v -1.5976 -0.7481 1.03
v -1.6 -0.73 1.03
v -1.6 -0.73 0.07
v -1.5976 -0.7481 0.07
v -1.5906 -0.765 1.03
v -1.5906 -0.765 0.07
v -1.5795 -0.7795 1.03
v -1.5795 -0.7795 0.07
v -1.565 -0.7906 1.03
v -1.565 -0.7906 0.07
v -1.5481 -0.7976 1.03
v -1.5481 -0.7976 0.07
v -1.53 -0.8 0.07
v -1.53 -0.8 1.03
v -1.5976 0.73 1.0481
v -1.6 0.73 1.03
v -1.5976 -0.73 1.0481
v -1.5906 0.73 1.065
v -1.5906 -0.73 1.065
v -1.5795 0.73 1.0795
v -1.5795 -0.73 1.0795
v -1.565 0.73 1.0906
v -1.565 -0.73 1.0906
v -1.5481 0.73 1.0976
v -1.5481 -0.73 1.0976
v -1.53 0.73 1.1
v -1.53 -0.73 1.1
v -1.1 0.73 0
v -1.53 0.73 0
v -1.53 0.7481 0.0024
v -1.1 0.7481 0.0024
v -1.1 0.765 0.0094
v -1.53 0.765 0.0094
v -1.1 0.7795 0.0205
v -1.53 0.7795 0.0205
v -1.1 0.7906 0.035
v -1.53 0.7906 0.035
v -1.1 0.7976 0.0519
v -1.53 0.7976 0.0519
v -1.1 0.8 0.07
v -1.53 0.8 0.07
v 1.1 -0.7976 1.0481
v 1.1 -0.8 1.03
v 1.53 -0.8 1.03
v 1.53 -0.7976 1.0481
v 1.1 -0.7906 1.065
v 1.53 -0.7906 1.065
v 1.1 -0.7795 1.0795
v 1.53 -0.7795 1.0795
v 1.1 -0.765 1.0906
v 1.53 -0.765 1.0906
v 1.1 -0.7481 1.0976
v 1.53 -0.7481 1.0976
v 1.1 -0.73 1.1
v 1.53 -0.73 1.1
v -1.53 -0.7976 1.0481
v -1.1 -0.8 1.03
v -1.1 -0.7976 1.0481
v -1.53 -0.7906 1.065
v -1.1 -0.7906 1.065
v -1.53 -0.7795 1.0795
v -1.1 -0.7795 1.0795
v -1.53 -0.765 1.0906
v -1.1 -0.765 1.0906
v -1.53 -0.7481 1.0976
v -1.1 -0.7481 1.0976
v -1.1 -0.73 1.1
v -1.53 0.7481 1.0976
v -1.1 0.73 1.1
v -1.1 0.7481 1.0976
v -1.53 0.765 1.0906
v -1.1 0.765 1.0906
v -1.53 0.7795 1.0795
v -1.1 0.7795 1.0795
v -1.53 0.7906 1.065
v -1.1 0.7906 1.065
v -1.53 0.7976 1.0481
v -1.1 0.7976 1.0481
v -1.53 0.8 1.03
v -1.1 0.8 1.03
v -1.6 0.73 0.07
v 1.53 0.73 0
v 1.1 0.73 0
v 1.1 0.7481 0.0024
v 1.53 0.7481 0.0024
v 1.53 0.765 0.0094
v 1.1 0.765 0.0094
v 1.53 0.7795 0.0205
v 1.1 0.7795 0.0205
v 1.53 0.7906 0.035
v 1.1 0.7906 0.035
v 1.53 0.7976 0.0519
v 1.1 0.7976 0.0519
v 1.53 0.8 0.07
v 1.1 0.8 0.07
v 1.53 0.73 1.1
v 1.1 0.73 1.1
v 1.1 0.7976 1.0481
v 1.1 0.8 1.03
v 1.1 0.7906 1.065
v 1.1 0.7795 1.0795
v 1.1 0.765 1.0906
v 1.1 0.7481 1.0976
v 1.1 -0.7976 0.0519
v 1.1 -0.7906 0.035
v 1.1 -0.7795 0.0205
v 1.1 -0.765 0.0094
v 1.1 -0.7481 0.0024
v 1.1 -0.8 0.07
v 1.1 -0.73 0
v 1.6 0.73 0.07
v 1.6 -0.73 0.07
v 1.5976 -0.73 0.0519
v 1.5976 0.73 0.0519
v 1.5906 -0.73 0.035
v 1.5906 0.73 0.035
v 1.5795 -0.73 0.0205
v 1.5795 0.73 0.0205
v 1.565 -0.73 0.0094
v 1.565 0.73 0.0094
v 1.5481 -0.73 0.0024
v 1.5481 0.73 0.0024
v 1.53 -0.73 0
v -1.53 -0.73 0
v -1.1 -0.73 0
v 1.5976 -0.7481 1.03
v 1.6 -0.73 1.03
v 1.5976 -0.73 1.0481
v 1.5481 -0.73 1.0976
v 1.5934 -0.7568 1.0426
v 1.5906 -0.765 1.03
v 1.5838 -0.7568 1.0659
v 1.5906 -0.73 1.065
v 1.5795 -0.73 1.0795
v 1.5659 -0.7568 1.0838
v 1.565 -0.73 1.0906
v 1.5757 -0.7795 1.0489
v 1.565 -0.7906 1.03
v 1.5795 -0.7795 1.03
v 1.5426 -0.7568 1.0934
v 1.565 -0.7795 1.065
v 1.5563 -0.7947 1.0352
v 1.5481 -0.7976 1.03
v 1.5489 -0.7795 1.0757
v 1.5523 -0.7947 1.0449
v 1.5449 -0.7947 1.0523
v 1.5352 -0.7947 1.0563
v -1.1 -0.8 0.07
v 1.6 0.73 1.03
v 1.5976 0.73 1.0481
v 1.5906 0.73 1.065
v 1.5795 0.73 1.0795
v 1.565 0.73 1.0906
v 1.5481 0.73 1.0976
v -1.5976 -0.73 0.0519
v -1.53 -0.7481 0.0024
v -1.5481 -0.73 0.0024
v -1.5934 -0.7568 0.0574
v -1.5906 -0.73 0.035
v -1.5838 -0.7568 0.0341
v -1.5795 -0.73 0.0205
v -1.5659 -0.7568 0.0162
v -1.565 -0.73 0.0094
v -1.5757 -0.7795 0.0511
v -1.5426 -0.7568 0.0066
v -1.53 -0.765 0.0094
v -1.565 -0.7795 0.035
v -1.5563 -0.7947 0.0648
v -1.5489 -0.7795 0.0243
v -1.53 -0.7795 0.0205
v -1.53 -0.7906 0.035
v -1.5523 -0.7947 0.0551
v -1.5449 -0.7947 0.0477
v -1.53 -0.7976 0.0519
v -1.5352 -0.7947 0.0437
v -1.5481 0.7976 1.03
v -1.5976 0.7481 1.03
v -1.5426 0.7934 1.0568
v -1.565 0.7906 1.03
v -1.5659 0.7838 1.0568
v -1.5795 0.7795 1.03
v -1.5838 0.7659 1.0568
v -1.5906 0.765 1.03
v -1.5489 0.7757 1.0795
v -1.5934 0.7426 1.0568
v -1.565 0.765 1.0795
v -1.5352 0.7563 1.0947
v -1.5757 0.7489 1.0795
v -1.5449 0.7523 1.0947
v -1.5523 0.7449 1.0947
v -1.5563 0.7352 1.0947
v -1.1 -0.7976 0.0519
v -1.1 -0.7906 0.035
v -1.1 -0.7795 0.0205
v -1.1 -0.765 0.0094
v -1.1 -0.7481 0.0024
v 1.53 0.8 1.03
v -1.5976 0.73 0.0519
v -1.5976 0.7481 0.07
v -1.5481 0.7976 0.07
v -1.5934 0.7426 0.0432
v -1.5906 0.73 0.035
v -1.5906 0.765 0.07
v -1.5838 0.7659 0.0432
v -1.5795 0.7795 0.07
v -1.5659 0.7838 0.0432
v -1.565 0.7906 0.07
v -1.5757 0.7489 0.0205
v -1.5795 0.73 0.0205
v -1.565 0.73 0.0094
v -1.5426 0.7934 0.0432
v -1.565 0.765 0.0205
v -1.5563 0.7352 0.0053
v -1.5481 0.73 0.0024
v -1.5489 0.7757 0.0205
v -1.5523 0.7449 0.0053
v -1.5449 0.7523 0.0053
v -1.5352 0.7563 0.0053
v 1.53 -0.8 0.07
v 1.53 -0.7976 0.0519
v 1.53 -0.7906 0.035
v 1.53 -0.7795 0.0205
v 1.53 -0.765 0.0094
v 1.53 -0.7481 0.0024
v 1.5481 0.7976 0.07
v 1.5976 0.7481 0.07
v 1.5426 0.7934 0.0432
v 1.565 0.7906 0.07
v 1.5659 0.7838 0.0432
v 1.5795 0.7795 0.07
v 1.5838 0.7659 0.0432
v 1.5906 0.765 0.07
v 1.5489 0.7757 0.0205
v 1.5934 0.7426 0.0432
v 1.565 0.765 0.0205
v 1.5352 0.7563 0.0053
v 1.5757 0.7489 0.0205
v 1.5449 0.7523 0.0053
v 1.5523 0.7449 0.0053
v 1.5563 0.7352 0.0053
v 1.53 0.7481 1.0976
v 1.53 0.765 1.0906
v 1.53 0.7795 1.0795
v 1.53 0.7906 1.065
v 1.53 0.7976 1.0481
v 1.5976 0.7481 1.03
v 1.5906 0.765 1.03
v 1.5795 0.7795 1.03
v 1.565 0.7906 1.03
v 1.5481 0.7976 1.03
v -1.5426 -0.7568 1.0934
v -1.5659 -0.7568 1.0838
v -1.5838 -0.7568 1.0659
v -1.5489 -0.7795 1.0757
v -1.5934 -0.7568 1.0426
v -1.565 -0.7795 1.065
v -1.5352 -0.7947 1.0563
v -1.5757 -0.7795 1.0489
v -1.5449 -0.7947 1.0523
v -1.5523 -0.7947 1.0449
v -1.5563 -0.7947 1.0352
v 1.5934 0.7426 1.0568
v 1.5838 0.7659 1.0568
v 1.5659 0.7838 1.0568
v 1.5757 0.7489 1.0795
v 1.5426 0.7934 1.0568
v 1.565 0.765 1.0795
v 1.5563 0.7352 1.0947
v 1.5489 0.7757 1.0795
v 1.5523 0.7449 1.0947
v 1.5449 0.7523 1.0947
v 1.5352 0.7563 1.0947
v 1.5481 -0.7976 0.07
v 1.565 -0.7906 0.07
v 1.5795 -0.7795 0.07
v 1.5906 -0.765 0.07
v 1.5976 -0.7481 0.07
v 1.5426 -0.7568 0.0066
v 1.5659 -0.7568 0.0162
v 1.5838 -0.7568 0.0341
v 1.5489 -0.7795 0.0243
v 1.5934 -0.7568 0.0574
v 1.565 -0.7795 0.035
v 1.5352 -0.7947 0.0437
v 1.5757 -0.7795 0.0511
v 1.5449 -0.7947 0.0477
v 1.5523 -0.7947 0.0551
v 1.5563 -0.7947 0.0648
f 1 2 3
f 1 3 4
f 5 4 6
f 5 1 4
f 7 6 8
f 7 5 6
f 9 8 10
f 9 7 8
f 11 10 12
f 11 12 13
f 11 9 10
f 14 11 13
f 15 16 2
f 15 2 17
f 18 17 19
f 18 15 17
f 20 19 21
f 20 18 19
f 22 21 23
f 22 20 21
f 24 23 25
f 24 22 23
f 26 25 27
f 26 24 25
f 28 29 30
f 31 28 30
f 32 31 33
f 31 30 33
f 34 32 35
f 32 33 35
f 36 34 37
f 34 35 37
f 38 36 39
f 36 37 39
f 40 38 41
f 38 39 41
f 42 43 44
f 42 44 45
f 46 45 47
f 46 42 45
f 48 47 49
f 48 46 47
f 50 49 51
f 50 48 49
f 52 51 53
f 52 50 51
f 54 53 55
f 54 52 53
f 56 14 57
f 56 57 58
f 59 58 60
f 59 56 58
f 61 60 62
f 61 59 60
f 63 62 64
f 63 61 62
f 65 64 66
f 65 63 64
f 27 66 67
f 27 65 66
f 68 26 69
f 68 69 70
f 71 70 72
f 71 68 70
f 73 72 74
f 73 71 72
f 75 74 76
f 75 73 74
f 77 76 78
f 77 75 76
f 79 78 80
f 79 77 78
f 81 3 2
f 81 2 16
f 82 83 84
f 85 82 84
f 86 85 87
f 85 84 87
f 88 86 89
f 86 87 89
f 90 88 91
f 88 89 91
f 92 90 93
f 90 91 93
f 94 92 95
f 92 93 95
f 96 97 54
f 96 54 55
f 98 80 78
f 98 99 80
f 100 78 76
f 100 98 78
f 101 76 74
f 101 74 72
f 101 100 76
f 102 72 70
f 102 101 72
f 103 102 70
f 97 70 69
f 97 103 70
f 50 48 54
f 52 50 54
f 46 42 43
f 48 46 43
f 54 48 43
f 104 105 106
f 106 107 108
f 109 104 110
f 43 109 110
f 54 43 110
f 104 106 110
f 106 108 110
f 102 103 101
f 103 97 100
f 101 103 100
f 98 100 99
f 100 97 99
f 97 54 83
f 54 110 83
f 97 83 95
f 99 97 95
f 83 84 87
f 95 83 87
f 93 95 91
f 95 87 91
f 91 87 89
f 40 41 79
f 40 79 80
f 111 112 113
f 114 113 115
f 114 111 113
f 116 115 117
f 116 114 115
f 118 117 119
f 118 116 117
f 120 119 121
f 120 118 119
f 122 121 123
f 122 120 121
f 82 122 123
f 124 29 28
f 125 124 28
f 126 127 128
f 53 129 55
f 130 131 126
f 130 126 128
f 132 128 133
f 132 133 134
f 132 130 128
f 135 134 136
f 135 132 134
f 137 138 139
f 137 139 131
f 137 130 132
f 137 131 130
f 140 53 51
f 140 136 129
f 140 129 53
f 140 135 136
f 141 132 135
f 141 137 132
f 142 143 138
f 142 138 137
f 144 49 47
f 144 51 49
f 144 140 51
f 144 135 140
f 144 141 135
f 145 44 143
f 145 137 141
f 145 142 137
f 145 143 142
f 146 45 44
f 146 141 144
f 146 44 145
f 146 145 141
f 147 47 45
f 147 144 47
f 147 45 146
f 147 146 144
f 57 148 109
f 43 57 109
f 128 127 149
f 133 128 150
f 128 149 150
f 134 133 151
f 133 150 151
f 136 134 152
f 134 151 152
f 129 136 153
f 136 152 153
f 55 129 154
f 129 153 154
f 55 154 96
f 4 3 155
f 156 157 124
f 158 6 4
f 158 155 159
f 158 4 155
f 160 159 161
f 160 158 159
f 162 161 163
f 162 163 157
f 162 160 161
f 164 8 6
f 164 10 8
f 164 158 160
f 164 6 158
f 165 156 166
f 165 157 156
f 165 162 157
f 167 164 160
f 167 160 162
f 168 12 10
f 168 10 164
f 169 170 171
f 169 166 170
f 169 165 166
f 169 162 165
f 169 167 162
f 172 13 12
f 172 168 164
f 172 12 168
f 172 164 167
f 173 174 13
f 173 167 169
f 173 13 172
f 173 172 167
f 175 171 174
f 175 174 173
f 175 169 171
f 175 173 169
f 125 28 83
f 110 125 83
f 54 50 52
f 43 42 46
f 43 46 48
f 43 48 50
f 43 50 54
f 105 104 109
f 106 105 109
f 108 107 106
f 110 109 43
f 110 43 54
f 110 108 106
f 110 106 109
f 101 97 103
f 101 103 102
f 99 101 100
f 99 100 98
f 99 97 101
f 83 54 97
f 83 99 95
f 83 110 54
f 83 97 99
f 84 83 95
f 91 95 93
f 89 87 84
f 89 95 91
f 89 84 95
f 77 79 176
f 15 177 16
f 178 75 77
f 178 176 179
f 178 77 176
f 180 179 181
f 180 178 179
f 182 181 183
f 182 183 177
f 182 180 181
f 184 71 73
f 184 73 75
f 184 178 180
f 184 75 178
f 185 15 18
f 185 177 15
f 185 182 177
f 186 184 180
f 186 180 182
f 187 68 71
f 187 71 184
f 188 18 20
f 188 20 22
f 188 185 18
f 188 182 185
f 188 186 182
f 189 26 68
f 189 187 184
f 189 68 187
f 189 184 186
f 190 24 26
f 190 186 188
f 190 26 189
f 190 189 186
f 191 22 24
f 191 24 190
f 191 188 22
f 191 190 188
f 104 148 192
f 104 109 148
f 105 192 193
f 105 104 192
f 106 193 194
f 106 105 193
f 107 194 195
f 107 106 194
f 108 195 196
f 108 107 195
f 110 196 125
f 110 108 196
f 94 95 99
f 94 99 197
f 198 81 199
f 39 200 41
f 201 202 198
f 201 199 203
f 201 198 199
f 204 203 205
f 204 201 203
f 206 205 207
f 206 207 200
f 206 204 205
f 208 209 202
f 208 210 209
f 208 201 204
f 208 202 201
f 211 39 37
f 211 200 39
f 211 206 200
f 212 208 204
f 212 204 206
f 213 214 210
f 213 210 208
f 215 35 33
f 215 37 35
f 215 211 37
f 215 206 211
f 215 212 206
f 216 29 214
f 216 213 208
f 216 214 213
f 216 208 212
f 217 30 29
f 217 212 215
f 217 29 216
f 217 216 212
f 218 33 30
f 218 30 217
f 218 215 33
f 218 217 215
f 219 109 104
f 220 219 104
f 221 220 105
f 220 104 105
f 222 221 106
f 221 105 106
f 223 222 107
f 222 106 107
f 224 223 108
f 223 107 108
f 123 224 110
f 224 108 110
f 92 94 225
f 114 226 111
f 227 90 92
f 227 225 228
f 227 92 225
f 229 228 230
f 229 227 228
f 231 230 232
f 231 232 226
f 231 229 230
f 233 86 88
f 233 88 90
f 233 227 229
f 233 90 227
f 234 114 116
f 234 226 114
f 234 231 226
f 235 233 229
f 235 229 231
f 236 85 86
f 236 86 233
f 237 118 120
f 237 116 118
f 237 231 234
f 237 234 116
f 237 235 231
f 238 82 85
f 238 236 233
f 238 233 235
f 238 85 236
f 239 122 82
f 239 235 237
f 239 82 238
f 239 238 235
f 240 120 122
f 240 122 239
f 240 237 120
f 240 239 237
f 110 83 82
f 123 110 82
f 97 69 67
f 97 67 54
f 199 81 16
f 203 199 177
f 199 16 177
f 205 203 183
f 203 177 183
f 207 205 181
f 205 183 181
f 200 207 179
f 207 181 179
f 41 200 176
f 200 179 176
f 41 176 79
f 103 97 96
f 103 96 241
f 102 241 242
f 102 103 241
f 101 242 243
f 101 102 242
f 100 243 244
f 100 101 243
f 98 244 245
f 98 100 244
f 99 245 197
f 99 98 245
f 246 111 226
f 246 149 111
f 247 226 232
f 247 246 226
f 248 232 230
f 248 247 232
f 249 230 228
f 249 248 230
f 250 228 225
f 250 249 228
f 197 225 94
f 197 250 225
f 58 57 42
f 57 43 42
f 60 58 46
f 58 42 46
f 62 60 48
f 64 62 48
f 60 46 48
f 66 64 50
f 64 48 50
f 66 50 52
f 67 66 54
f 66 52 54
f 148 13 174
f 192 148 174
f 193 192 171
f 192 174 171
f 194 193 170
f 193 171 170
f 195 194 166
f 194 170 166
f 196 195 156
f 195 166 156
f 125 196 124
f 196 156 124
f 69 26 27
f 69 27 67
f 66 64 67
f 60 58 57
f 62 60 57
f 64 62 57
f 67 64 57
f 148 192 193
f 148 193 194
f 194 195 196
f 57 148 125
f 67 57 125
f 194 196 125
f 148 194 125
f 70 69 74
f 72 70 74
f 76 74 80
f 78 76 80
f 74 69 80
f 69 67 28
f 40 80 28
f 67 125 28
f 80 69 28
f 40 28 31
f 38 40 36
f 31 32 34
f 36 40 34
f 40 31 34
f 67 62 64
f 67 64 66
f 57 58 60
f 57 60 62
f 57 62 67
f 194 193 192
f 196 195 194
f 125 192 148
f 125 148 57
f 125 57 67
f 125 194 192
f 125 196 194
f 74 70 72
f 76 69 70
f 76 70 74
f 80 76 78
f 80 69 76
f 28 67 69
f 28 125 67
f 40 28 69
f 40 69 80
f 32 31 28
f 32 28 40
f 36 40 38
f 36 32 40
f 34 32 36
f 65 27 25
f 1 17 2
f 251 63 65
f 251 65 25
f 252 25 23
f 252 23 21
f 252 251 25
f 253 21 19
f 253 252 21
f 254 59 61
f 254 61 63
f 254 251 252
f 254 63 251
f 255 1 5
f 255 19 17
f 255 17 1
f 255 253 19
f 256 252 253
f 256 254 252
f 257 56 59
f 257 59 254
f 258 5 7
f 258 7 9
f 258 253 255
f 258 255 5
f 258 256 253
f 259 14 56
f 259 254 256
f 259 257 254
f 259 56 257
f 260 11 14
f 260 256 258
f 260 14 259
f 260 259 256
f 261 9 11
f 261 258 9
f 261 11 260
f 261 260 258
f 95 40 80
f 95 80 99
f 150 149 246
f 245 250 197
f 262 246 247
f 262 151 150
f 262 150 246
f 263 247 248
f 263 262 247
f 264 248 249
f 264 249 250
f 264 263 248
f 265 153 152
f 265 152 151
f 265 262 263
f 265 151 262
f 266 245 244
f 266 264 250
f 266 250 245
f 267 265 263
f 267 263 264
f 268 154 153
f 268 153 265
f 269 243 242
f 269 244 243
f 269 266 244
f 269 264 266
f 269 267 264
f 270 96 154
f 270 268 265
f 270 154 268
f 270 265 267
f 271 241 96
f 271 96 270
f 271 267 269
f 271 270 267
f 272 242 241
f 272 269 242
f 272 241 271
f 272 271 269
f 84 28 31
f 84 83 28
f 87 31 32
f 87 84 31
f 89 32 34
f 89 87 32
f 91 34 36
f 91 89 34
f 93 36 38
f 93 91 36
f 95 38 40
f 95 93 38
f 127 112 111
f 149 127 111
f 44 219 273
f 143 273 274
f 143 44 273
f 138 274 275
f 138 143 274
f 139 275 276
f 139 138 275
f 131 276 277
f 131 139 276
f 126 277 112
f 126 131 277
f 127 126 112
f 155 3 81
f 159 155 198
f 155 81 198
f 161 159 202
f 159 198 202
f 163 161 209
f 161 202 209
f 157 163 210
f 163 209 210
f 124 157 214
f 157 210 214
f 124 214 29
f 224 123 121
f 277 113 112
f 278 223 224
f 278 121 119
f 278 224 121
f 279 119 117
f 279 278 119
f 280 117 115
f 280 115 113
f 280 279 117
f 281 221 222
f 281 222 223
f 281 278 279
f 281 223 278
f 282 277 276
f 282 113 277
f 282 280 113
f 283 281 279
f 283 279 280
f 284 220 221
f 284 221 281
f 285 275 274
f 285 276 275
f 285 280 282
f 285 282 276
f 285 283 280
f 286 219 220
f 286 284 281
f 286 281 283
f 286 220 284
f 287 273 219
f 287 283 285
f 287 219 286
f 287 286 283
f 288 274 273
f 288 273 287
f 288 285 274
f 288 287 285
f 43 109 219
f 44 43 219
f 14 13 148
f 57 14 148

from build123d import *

# Parameters (mm, degrees)
F0_W           = 0.5
F0_H           = 1.6
F1_DEPTH       = 1.1
F0_W_2         = 2.2
F2_DEPTH       = 1.1
F3_R           = 0.07
F3_2_R         = 0.07
F4_T1_DEPTH    = 0.605
F4_S5_W        = 0.07
F4_S5_H        = 0.07
F4_T6_DEPTH    = 0.07
F4_S11_W       = 0.07
F4_S11_H       = 0.07
F4_T12_DEPTH   = 0.07
F4_S17_W       = 0.07
F4_S17_H       = 0.07
F4_T18_DEPTH   = 0.07
F4_S23_W       = 0.07
F4_S23_H       = 0.07
F4_T24_DEPTH   = 0.07
F4_2_F1_R      = 0.07
F4_2_F2_R      = 0.07
F4_2_F3_R      = 0.07
F4_2_F4_R      = 0.07
F4_3_T1_DEPTH  = 0.605
F4_3_S5_W      = 0.07
F4_3_S5_H      = 0.07
F4_3_T6_DEPTH  = 0.07
F4_3_S11_W     = 0.07
F4_3_S11_H     = 0.07
F4_3_T12_DEPTH = 0.07
F4_3_S17_W     = 0.07
F4_3_S17_H     = 0.07
F4_3_T18_DEPTH = 0.07
F4_3_S23_W     = 0.07
F4_3_S23_H     = 0.07
F4_3_T24_DEPTH = 0.07


# Not quite as in the source:
# - a fillet or chamfer that OpenCascade refuses, or shapes differently, is made with other operations: its cross-section is extruded or revolved along the edge and cut away or added


with BuildPart() as f1:
    # F0 (on Top) → F1 (new body)
    with BuildSketch(Plane.XY):
        with Locations((-1.35, 0)):
            Rectangle(F0_W, F0_H)
    extrude(amount=F1_DEPTH)

    # F3#2
    f3_2_edges = [f1.edges().sort_by_distance(p)[0] for p in [
        (-1.6, 0.8, 0.55),
        (-1.6, -0.8, 0.55),
        (-1.6, 0, 0),
        (-1.6, 0, 1.1),
    ]]
    fillet(f3_2_edges, radius=F3_2_R)

    # F4#3: fillet of radius 0.07 on 4 edges, made by hand

    # F4_3_s2 → F4_3_t1 (cut)
    with BuildSketch(Plane.YZ.offset(-1.53)):
        with BuildLine():
            ThreePointArc((0.73, 1.1), (0.7794974747, 1.0794974747), (0.8, 1.03))
            Line((0.8, 1.03), (0.8, 1.1))
            Line((0.8, 1.1), (0.73, 1.1))
        make_face()
        with BuildLine():
            ThreePointArc((0.73, 0), (0.7794974747, 0.0205025253), (0.8, 0.07))
            Line((0.8, 0.07), (0.8, 0))
            Line((0.8, 0), (0.73, 0))
        make_face()
        with BuildLine():
            ThreePointArc((-0.8, 1.03), (-0.7794974747, 1.0794974747), (-0.73, 1.1))
            Line((-0.73, 1.1), (-0.8, 1.1))
            Line((-0.8, 1.1), (-0.8, 1.03))
        make_face()
        with BuildLine():
            ThreePointArc((-0.8, 0.07), (-0.7794974747, 0.0205025253), (-0.73, 0))
            Line((-0.73, 0), (-0.8, 0))
            Line((-0.8, 0), (-0.8, 0.07))
        make_face()
    extrude(amount=F4_3_T1_DEPTH, mode=Mode.SUBTRACT)


with BuildPart() as f1b:
    # F0 (on Top) → F1, piece 2 (new body)
    with BuildSketch(Plane.XY):
        with Locations((1.35, 0)):
            Rectangle(F0_W, F0_H)
    extrude(amount=F1_DEPTH)

    # F3
    f3_edges = [f1b.edges().sort_by_distance(p)[0] for p in [
        (1.6, -0.8, 0.55),
        (1.6, 0.8, 0.55),
        (1.6, 0, 0),
        (1.6, 0, 1.1),
    ]]
    fillet(f3_edges, radius=F3_R)

    # F4: fillet of radius 0.07 on 4 edges, made by hand

    # F4_s2 → F4_t1 (cut)
    with BuildSketch(Plane.YZ.offset(0.925)):
        with BuildLine():
            ThreePointArc((0.73, 1.1), (0.7794974747, 1.0794974747), (0.8, 1.03))
            Line((0.8, 1.03), (0.8, 1.1))
            Line((0.8, 1.1), (0.73, 1.1))
        make_face()
        with BuildLine():
            ThreePointArc((0.73, 0), (0.7794974747, 0.0205025253), (0.8, 0.07))
            Line((0.8, 0.07), (0.8, 0))
            Line((0.8, 0), (0.73, 0))
        make_face()
        with BuildLine():
            ThreePointArc((-0.8, 1.03), (-0.7794974747, 1.0794974747), (-0.73, 1.1))
            Line((-0.73, 1.1), (-0.8, 1.1))
            Line((-0.8, 1.1), (-0.8, 1.03))
        make_face()
        with BuildLine():
            ThreePointArc((-0.8, 0.07), (-0.7794974747, 0.0205025253), (-0.73, 0))
            Line((-0.73, 0), (-0.8, 0))
            Line((-0.8, 0), (-0.8, 0.07))
        make_face()
    extrude(amount=F4_T1_DEPTH, mode=Mode.SUBTRACT)


with BuildPart() as f2:
    # F0 (on Top) → F2 (new body)
    with BuildSketch(Plane.XY):
        Rectangle(F0_W_2, F0_H)
    extrude(amount=F2_DEPTH)

    # F4#2: fillet of radius 0.07 on 4 edges, made by hand

    # F4_2_f1
    f4_2_f1_edges = [f2.edges().sort_by_distance(p)[0] for p in [
        (0, -0.8, 0),
    ]]
    fillet(f4_2_f1_edges, radius=F4_2_F1_R)

    # F4_2_f2
    f4_2_f2_edges = [f2.edges().sort_by_distance(p)[0] for p in [
        (0, -0.8, 1.1),
    ]]
    fillet(f4_2_f2_edges, radius=F4_2_F2_R)

    # F4_2_f3
    f4_2_f3_edges = [f2.edges().sort_by_distance(p)[0] for p in [
        (0, 0.8, 0),
    ]]
    fillet(f4_2_f3_edges, radius=F4_2_F3_R)

    # F4_2_f4
    f4_2_f4_edges = [f2.edges().sort_by_distance(p)[0] for p in [
        (0, 0.8, 1.1),
    ]]
    fillet(f4_2_f4_edges, radius=F4_2_F4_R)


with BuildPart() as f4_tool4:
    # F4_s5 → F4_t6 (new body)
    with BuildSketch(Plane.XZ.offset(0.73)):
        with Locations((1.565, 0.035)):
            Rectangle(F4_S5_W, F4_S5_H)
    extrude(amount=F4_T6_DEPTH)

    # F4_s7 → F4_t8 (revolve, cut)
    with BuildSketch(Plane(origin=(1.53, -0.73, 0.07), x_dir=(-0.7071067812, 0, 0.7071067812), z_dir=(0.7071067812, 0, 0.7071067812))):
        with BuildLine():
            ThreePointArc((0, -0.07), (0.07, 0), (0, 0.07))
            Line((0, 0.07), (0, -0.07))
        make_face()
    revolve(axis=Axis((1.53, -0.73, 0.07), (0, -1, 0)), mode=Mode.SUBTRACT)


with BuildPart() as f1b_1:
    add(f1b.part)

    # F4_t3: cut F4_tool4
    add(f4_tool4.part, mode=Mode.SUBTRACT)


with BuildPart() as f4_tool10:
    # F4_s11 → F4_t12 (new body)
    with BuildSketch(Plane.XZ.offset(0.73)):
        with Locations((1.565, 1.065)):
            Rectangle(F4_S11_W, F4_S11_H)
    extrude(amount=F4_T12_DEPTH)

    # F4_s13 → F4_t14 (revolve, cut)
    with BuildSketch(Plane(origin=(1.53, -0.73, 1.03), x_dir=(-0.7071067812, 0, -0.7071067812), z_dir=(-0.7071067812, 0, 0.7071067812))):
        with BuildLine():
            ThreePointArc((0, -0.07), (0.07, 0), (0, 0.07))
            Line((0, 0.07), (0, -0.07))
        make_face()
    revolve(axis=Axis((1.53, -0.73, 1.03), (0, -1, 0)), mode=Mode.SUBTRACT)


with BuildPart() as f1b_2:
    add(f1b_1.part)

    # F4_t9: cut F4_tool10
    add(f4_tool10.part, mode=Mode.SUBTRACT)


with BuildPart() as f4_tool16:
    # F4_s17 → F4_t18 (new body)
    with BuildSketch(Plane.XY.offset(0.07)):
        with Locations((1.565, 0.765)):
            Rectangle(F4_S17_W, F4_S17_H)
    extrude(amount=-F4_T18_DEPTH)

    # F4_s19 → F4_t20 (revolve, cut)
    with BuildSketch(Plane(origin=(1.53, 0.73, 0.07), x_dir=(-0.7071067812, -0.7071067812, 0), z_dir=(0.7071067812, -0.7071067812, 0))):
        with BuildLine():
            ThreePointArc((0, -0.07), (0.07, 0), (0, 0.07))
            Line((0, 0.07), (0, -0.07))
        make_face()
    revolve(axis=Axis((1.53, 0.73, 0.07), (0, 0, -1)), mode=Mode.SUBTRACT)


with BuildPart() as f1b_3:
    add(f1b_2.part)

    # F4_t15: cut F4_tool16
    add(f4_tool16.part, mode=Mode.SUBTRACT)


with BuildPart() as f4_tool22:
    # F4_s23 → F4_t24 (new body)
    with BuildSketch(Plane.XY.offset(1.03)):
        with Locations((1.565, 0.765)):
            Rectangle(F4_S23_W, F4_S23_H)
    extrude(amount=F4_T24_DEPTH)

    # F4_s25 → F4_t26 (revolve, cut)
    with BuildSketch(Plane(origin=(1.53, 0.73, 1.03), x_dir=(-0.7071067812, -0.7071067812, 0), z_dir=(-0.7071067812, 0.7071067812, 0))):
        with BuildLine():
            ThreePointArc((0, -0.07), (0.07, 0), (0, 0.07))
            Line((0, 0.07), (0, -0.07))
        make_face()
    revolve(axis=Axis((1.53, 0.73, 1.03), (0, 0, 1)), mode=Mode.SUBTRACT)


with BuildPart() as f1b_4:
    add(f1b_3.part)

    # F4_t21: cut F4_tool22
    add(f4_tool22.part, mode=Mode.SUBTRACT)


with BuildPart() as f4_3_tool4:
    # F4_3_s5 → F4_3_t6 (new body)
    with BuildSketch(Plane.XZ.offset(0.73)):
        with Locations((-1.565, 0.035)):
            Rectangle(F4_3_S5_W, F4_3_S5_H)
    extrude(amount=F4_3_T6_DEPTH)

    # F4_3_s7 → F4_3_t8 (revolve, cut)
    with BuildSketch(Plane(origin=(-1.53, -0.73, 0.07), x_dir=(0.7071067812, 0, 0.7071067812), z_dir=(0.7071067812, 0, -0.7071067812))):
        with BuildLine():
            ThreePointArc((0, -0.07), (0.07, 0), (0, 0.07))
            Line((0, 0.07), (0, -0.07))
        make_face()
    revolve(axis=Axis((-1.53, -0.73, 0.07), (0, -1, 0)), mode=Mode.SUBTRACT)


with BuildPart() as f1_1:
    add(f1.part)

    # F4_3_t3: cut F4_3_tool4
    add(f4_3_tool4.part, mode=Mode.SUBTRACT)


with BuildPart() as f4_3_tool10:
    # F4_3_s11 → F4_3_t12 (new body)
    with BuildSketch(Plane.XZ.offset(0.73)):
        with Locations((-1.565, 1.065)):
            Rectangle(F4_3_S11_W, F4_3_S11_H)
    extrude(amount=F4_3_T12_DEPTH)

    # F4_3_s13 → F4_3_t14 (revolve, cut)
    with BuildSketch(Plane(origin=(-1.53, -0.73, 1.03), x_dir=(0.7071067812, 0, -0.7071067812), z_dir=(-0.7071067812, 0, -0.7071067812))):
        with BuildLine():
            ThreePointArc((0, -0.07), (0.07, 0), (0, 0.07))
            Line((0, 0.07), (0, -0.07))
        make_face()
    revolve(axis=Axis((-1.53, -0.73, 1.03), (0, -1, 0)), mode=Mode.SUBTRACT)


with BuildPart() as f1_2:
    add(f1_1.part)

    # F4_3_t9: cut F4_3_tool10
    add(f4_3_tool10.part, mode=Mode.SUBTRACT)


with BuildPart() as f4_3_tool16:
    # F4_3_s17 → F4_3_t18 (new body)
    with BuildSketch(Plane.XY.offset(0.07)):
        with Locations((-1.565, 0.765)):
            Rectangle(F4_3_S17_W, F4_3_S17_H)
    extrude(amount=-F4_3_T18_DEPTH)

    # F4_3_s19 → F4_3_t20 (revolve, cut)
    with BuildSketch(Plane(origin=(-1.53, 0.73, 0.07), x_dir=(0.7071067812, -0.7071067812, 0), z_dir=(0.7071067812, 0.7071067812, 0))):
        with BuildLine():
            ThreePointArc((0, -0.07), (0.07, 0), (0, 0.07))
            Line((0, 0.07), (0, -0.07))
        make_face()
    revolve(axis=Axis((-1.53, 0.73, 0.07), (0, 0, -1)), mode=Mode.SUBTRACT)


with BuildPart() as f1_3:
    add(f1_2.part)

    # F4_3_t15: cut F4_3_tool16
    add(f4_3_tool16.part, mode=Mode.SUBTRACT)


with BuildPart() as f4_3_tool22:
    # F4_3_s23 → F4_3_t24 (new body)
    with BuildSketch(Plane.XY.offset(1.03)):
        with Locations((-1.565, 0.765)):
            Rectangle(F4_3_S23_W, F4_3_S23_H)
    extrude(amount=F4_3_T24_DEPTH)

    # F4_3_s25 → F4_3_t26 (revolve, cut)
    with BuildSketch(Plane(origin=(-1.53, 0.73, 1.03), x_dir=(0.7071067812, -0.7071067812, 0), z_dir=(-0.7071067812, -0.7071067812, 0))):
        with BuildLine():
            ThreePointArc((0, -0.07), (0.07, 0), (0, 0.07))
            Line((0, 0.07), (0, -0.07))
        make_face()
    revolve(axis=Axis((-1.53, 0.73, 1.03), (0, 0, 1)), mode=Mode.SUBTRACT)


with BuildPart() as f1_4:
    add(f1_3.part)

    # F4_3_t21: cut F4_3_tool22
    add(f4_3_tool22.part, mode=Mode.SUBTRACT)


solid = Compound([f2.part, f1b_4.part, f1_4.part])
